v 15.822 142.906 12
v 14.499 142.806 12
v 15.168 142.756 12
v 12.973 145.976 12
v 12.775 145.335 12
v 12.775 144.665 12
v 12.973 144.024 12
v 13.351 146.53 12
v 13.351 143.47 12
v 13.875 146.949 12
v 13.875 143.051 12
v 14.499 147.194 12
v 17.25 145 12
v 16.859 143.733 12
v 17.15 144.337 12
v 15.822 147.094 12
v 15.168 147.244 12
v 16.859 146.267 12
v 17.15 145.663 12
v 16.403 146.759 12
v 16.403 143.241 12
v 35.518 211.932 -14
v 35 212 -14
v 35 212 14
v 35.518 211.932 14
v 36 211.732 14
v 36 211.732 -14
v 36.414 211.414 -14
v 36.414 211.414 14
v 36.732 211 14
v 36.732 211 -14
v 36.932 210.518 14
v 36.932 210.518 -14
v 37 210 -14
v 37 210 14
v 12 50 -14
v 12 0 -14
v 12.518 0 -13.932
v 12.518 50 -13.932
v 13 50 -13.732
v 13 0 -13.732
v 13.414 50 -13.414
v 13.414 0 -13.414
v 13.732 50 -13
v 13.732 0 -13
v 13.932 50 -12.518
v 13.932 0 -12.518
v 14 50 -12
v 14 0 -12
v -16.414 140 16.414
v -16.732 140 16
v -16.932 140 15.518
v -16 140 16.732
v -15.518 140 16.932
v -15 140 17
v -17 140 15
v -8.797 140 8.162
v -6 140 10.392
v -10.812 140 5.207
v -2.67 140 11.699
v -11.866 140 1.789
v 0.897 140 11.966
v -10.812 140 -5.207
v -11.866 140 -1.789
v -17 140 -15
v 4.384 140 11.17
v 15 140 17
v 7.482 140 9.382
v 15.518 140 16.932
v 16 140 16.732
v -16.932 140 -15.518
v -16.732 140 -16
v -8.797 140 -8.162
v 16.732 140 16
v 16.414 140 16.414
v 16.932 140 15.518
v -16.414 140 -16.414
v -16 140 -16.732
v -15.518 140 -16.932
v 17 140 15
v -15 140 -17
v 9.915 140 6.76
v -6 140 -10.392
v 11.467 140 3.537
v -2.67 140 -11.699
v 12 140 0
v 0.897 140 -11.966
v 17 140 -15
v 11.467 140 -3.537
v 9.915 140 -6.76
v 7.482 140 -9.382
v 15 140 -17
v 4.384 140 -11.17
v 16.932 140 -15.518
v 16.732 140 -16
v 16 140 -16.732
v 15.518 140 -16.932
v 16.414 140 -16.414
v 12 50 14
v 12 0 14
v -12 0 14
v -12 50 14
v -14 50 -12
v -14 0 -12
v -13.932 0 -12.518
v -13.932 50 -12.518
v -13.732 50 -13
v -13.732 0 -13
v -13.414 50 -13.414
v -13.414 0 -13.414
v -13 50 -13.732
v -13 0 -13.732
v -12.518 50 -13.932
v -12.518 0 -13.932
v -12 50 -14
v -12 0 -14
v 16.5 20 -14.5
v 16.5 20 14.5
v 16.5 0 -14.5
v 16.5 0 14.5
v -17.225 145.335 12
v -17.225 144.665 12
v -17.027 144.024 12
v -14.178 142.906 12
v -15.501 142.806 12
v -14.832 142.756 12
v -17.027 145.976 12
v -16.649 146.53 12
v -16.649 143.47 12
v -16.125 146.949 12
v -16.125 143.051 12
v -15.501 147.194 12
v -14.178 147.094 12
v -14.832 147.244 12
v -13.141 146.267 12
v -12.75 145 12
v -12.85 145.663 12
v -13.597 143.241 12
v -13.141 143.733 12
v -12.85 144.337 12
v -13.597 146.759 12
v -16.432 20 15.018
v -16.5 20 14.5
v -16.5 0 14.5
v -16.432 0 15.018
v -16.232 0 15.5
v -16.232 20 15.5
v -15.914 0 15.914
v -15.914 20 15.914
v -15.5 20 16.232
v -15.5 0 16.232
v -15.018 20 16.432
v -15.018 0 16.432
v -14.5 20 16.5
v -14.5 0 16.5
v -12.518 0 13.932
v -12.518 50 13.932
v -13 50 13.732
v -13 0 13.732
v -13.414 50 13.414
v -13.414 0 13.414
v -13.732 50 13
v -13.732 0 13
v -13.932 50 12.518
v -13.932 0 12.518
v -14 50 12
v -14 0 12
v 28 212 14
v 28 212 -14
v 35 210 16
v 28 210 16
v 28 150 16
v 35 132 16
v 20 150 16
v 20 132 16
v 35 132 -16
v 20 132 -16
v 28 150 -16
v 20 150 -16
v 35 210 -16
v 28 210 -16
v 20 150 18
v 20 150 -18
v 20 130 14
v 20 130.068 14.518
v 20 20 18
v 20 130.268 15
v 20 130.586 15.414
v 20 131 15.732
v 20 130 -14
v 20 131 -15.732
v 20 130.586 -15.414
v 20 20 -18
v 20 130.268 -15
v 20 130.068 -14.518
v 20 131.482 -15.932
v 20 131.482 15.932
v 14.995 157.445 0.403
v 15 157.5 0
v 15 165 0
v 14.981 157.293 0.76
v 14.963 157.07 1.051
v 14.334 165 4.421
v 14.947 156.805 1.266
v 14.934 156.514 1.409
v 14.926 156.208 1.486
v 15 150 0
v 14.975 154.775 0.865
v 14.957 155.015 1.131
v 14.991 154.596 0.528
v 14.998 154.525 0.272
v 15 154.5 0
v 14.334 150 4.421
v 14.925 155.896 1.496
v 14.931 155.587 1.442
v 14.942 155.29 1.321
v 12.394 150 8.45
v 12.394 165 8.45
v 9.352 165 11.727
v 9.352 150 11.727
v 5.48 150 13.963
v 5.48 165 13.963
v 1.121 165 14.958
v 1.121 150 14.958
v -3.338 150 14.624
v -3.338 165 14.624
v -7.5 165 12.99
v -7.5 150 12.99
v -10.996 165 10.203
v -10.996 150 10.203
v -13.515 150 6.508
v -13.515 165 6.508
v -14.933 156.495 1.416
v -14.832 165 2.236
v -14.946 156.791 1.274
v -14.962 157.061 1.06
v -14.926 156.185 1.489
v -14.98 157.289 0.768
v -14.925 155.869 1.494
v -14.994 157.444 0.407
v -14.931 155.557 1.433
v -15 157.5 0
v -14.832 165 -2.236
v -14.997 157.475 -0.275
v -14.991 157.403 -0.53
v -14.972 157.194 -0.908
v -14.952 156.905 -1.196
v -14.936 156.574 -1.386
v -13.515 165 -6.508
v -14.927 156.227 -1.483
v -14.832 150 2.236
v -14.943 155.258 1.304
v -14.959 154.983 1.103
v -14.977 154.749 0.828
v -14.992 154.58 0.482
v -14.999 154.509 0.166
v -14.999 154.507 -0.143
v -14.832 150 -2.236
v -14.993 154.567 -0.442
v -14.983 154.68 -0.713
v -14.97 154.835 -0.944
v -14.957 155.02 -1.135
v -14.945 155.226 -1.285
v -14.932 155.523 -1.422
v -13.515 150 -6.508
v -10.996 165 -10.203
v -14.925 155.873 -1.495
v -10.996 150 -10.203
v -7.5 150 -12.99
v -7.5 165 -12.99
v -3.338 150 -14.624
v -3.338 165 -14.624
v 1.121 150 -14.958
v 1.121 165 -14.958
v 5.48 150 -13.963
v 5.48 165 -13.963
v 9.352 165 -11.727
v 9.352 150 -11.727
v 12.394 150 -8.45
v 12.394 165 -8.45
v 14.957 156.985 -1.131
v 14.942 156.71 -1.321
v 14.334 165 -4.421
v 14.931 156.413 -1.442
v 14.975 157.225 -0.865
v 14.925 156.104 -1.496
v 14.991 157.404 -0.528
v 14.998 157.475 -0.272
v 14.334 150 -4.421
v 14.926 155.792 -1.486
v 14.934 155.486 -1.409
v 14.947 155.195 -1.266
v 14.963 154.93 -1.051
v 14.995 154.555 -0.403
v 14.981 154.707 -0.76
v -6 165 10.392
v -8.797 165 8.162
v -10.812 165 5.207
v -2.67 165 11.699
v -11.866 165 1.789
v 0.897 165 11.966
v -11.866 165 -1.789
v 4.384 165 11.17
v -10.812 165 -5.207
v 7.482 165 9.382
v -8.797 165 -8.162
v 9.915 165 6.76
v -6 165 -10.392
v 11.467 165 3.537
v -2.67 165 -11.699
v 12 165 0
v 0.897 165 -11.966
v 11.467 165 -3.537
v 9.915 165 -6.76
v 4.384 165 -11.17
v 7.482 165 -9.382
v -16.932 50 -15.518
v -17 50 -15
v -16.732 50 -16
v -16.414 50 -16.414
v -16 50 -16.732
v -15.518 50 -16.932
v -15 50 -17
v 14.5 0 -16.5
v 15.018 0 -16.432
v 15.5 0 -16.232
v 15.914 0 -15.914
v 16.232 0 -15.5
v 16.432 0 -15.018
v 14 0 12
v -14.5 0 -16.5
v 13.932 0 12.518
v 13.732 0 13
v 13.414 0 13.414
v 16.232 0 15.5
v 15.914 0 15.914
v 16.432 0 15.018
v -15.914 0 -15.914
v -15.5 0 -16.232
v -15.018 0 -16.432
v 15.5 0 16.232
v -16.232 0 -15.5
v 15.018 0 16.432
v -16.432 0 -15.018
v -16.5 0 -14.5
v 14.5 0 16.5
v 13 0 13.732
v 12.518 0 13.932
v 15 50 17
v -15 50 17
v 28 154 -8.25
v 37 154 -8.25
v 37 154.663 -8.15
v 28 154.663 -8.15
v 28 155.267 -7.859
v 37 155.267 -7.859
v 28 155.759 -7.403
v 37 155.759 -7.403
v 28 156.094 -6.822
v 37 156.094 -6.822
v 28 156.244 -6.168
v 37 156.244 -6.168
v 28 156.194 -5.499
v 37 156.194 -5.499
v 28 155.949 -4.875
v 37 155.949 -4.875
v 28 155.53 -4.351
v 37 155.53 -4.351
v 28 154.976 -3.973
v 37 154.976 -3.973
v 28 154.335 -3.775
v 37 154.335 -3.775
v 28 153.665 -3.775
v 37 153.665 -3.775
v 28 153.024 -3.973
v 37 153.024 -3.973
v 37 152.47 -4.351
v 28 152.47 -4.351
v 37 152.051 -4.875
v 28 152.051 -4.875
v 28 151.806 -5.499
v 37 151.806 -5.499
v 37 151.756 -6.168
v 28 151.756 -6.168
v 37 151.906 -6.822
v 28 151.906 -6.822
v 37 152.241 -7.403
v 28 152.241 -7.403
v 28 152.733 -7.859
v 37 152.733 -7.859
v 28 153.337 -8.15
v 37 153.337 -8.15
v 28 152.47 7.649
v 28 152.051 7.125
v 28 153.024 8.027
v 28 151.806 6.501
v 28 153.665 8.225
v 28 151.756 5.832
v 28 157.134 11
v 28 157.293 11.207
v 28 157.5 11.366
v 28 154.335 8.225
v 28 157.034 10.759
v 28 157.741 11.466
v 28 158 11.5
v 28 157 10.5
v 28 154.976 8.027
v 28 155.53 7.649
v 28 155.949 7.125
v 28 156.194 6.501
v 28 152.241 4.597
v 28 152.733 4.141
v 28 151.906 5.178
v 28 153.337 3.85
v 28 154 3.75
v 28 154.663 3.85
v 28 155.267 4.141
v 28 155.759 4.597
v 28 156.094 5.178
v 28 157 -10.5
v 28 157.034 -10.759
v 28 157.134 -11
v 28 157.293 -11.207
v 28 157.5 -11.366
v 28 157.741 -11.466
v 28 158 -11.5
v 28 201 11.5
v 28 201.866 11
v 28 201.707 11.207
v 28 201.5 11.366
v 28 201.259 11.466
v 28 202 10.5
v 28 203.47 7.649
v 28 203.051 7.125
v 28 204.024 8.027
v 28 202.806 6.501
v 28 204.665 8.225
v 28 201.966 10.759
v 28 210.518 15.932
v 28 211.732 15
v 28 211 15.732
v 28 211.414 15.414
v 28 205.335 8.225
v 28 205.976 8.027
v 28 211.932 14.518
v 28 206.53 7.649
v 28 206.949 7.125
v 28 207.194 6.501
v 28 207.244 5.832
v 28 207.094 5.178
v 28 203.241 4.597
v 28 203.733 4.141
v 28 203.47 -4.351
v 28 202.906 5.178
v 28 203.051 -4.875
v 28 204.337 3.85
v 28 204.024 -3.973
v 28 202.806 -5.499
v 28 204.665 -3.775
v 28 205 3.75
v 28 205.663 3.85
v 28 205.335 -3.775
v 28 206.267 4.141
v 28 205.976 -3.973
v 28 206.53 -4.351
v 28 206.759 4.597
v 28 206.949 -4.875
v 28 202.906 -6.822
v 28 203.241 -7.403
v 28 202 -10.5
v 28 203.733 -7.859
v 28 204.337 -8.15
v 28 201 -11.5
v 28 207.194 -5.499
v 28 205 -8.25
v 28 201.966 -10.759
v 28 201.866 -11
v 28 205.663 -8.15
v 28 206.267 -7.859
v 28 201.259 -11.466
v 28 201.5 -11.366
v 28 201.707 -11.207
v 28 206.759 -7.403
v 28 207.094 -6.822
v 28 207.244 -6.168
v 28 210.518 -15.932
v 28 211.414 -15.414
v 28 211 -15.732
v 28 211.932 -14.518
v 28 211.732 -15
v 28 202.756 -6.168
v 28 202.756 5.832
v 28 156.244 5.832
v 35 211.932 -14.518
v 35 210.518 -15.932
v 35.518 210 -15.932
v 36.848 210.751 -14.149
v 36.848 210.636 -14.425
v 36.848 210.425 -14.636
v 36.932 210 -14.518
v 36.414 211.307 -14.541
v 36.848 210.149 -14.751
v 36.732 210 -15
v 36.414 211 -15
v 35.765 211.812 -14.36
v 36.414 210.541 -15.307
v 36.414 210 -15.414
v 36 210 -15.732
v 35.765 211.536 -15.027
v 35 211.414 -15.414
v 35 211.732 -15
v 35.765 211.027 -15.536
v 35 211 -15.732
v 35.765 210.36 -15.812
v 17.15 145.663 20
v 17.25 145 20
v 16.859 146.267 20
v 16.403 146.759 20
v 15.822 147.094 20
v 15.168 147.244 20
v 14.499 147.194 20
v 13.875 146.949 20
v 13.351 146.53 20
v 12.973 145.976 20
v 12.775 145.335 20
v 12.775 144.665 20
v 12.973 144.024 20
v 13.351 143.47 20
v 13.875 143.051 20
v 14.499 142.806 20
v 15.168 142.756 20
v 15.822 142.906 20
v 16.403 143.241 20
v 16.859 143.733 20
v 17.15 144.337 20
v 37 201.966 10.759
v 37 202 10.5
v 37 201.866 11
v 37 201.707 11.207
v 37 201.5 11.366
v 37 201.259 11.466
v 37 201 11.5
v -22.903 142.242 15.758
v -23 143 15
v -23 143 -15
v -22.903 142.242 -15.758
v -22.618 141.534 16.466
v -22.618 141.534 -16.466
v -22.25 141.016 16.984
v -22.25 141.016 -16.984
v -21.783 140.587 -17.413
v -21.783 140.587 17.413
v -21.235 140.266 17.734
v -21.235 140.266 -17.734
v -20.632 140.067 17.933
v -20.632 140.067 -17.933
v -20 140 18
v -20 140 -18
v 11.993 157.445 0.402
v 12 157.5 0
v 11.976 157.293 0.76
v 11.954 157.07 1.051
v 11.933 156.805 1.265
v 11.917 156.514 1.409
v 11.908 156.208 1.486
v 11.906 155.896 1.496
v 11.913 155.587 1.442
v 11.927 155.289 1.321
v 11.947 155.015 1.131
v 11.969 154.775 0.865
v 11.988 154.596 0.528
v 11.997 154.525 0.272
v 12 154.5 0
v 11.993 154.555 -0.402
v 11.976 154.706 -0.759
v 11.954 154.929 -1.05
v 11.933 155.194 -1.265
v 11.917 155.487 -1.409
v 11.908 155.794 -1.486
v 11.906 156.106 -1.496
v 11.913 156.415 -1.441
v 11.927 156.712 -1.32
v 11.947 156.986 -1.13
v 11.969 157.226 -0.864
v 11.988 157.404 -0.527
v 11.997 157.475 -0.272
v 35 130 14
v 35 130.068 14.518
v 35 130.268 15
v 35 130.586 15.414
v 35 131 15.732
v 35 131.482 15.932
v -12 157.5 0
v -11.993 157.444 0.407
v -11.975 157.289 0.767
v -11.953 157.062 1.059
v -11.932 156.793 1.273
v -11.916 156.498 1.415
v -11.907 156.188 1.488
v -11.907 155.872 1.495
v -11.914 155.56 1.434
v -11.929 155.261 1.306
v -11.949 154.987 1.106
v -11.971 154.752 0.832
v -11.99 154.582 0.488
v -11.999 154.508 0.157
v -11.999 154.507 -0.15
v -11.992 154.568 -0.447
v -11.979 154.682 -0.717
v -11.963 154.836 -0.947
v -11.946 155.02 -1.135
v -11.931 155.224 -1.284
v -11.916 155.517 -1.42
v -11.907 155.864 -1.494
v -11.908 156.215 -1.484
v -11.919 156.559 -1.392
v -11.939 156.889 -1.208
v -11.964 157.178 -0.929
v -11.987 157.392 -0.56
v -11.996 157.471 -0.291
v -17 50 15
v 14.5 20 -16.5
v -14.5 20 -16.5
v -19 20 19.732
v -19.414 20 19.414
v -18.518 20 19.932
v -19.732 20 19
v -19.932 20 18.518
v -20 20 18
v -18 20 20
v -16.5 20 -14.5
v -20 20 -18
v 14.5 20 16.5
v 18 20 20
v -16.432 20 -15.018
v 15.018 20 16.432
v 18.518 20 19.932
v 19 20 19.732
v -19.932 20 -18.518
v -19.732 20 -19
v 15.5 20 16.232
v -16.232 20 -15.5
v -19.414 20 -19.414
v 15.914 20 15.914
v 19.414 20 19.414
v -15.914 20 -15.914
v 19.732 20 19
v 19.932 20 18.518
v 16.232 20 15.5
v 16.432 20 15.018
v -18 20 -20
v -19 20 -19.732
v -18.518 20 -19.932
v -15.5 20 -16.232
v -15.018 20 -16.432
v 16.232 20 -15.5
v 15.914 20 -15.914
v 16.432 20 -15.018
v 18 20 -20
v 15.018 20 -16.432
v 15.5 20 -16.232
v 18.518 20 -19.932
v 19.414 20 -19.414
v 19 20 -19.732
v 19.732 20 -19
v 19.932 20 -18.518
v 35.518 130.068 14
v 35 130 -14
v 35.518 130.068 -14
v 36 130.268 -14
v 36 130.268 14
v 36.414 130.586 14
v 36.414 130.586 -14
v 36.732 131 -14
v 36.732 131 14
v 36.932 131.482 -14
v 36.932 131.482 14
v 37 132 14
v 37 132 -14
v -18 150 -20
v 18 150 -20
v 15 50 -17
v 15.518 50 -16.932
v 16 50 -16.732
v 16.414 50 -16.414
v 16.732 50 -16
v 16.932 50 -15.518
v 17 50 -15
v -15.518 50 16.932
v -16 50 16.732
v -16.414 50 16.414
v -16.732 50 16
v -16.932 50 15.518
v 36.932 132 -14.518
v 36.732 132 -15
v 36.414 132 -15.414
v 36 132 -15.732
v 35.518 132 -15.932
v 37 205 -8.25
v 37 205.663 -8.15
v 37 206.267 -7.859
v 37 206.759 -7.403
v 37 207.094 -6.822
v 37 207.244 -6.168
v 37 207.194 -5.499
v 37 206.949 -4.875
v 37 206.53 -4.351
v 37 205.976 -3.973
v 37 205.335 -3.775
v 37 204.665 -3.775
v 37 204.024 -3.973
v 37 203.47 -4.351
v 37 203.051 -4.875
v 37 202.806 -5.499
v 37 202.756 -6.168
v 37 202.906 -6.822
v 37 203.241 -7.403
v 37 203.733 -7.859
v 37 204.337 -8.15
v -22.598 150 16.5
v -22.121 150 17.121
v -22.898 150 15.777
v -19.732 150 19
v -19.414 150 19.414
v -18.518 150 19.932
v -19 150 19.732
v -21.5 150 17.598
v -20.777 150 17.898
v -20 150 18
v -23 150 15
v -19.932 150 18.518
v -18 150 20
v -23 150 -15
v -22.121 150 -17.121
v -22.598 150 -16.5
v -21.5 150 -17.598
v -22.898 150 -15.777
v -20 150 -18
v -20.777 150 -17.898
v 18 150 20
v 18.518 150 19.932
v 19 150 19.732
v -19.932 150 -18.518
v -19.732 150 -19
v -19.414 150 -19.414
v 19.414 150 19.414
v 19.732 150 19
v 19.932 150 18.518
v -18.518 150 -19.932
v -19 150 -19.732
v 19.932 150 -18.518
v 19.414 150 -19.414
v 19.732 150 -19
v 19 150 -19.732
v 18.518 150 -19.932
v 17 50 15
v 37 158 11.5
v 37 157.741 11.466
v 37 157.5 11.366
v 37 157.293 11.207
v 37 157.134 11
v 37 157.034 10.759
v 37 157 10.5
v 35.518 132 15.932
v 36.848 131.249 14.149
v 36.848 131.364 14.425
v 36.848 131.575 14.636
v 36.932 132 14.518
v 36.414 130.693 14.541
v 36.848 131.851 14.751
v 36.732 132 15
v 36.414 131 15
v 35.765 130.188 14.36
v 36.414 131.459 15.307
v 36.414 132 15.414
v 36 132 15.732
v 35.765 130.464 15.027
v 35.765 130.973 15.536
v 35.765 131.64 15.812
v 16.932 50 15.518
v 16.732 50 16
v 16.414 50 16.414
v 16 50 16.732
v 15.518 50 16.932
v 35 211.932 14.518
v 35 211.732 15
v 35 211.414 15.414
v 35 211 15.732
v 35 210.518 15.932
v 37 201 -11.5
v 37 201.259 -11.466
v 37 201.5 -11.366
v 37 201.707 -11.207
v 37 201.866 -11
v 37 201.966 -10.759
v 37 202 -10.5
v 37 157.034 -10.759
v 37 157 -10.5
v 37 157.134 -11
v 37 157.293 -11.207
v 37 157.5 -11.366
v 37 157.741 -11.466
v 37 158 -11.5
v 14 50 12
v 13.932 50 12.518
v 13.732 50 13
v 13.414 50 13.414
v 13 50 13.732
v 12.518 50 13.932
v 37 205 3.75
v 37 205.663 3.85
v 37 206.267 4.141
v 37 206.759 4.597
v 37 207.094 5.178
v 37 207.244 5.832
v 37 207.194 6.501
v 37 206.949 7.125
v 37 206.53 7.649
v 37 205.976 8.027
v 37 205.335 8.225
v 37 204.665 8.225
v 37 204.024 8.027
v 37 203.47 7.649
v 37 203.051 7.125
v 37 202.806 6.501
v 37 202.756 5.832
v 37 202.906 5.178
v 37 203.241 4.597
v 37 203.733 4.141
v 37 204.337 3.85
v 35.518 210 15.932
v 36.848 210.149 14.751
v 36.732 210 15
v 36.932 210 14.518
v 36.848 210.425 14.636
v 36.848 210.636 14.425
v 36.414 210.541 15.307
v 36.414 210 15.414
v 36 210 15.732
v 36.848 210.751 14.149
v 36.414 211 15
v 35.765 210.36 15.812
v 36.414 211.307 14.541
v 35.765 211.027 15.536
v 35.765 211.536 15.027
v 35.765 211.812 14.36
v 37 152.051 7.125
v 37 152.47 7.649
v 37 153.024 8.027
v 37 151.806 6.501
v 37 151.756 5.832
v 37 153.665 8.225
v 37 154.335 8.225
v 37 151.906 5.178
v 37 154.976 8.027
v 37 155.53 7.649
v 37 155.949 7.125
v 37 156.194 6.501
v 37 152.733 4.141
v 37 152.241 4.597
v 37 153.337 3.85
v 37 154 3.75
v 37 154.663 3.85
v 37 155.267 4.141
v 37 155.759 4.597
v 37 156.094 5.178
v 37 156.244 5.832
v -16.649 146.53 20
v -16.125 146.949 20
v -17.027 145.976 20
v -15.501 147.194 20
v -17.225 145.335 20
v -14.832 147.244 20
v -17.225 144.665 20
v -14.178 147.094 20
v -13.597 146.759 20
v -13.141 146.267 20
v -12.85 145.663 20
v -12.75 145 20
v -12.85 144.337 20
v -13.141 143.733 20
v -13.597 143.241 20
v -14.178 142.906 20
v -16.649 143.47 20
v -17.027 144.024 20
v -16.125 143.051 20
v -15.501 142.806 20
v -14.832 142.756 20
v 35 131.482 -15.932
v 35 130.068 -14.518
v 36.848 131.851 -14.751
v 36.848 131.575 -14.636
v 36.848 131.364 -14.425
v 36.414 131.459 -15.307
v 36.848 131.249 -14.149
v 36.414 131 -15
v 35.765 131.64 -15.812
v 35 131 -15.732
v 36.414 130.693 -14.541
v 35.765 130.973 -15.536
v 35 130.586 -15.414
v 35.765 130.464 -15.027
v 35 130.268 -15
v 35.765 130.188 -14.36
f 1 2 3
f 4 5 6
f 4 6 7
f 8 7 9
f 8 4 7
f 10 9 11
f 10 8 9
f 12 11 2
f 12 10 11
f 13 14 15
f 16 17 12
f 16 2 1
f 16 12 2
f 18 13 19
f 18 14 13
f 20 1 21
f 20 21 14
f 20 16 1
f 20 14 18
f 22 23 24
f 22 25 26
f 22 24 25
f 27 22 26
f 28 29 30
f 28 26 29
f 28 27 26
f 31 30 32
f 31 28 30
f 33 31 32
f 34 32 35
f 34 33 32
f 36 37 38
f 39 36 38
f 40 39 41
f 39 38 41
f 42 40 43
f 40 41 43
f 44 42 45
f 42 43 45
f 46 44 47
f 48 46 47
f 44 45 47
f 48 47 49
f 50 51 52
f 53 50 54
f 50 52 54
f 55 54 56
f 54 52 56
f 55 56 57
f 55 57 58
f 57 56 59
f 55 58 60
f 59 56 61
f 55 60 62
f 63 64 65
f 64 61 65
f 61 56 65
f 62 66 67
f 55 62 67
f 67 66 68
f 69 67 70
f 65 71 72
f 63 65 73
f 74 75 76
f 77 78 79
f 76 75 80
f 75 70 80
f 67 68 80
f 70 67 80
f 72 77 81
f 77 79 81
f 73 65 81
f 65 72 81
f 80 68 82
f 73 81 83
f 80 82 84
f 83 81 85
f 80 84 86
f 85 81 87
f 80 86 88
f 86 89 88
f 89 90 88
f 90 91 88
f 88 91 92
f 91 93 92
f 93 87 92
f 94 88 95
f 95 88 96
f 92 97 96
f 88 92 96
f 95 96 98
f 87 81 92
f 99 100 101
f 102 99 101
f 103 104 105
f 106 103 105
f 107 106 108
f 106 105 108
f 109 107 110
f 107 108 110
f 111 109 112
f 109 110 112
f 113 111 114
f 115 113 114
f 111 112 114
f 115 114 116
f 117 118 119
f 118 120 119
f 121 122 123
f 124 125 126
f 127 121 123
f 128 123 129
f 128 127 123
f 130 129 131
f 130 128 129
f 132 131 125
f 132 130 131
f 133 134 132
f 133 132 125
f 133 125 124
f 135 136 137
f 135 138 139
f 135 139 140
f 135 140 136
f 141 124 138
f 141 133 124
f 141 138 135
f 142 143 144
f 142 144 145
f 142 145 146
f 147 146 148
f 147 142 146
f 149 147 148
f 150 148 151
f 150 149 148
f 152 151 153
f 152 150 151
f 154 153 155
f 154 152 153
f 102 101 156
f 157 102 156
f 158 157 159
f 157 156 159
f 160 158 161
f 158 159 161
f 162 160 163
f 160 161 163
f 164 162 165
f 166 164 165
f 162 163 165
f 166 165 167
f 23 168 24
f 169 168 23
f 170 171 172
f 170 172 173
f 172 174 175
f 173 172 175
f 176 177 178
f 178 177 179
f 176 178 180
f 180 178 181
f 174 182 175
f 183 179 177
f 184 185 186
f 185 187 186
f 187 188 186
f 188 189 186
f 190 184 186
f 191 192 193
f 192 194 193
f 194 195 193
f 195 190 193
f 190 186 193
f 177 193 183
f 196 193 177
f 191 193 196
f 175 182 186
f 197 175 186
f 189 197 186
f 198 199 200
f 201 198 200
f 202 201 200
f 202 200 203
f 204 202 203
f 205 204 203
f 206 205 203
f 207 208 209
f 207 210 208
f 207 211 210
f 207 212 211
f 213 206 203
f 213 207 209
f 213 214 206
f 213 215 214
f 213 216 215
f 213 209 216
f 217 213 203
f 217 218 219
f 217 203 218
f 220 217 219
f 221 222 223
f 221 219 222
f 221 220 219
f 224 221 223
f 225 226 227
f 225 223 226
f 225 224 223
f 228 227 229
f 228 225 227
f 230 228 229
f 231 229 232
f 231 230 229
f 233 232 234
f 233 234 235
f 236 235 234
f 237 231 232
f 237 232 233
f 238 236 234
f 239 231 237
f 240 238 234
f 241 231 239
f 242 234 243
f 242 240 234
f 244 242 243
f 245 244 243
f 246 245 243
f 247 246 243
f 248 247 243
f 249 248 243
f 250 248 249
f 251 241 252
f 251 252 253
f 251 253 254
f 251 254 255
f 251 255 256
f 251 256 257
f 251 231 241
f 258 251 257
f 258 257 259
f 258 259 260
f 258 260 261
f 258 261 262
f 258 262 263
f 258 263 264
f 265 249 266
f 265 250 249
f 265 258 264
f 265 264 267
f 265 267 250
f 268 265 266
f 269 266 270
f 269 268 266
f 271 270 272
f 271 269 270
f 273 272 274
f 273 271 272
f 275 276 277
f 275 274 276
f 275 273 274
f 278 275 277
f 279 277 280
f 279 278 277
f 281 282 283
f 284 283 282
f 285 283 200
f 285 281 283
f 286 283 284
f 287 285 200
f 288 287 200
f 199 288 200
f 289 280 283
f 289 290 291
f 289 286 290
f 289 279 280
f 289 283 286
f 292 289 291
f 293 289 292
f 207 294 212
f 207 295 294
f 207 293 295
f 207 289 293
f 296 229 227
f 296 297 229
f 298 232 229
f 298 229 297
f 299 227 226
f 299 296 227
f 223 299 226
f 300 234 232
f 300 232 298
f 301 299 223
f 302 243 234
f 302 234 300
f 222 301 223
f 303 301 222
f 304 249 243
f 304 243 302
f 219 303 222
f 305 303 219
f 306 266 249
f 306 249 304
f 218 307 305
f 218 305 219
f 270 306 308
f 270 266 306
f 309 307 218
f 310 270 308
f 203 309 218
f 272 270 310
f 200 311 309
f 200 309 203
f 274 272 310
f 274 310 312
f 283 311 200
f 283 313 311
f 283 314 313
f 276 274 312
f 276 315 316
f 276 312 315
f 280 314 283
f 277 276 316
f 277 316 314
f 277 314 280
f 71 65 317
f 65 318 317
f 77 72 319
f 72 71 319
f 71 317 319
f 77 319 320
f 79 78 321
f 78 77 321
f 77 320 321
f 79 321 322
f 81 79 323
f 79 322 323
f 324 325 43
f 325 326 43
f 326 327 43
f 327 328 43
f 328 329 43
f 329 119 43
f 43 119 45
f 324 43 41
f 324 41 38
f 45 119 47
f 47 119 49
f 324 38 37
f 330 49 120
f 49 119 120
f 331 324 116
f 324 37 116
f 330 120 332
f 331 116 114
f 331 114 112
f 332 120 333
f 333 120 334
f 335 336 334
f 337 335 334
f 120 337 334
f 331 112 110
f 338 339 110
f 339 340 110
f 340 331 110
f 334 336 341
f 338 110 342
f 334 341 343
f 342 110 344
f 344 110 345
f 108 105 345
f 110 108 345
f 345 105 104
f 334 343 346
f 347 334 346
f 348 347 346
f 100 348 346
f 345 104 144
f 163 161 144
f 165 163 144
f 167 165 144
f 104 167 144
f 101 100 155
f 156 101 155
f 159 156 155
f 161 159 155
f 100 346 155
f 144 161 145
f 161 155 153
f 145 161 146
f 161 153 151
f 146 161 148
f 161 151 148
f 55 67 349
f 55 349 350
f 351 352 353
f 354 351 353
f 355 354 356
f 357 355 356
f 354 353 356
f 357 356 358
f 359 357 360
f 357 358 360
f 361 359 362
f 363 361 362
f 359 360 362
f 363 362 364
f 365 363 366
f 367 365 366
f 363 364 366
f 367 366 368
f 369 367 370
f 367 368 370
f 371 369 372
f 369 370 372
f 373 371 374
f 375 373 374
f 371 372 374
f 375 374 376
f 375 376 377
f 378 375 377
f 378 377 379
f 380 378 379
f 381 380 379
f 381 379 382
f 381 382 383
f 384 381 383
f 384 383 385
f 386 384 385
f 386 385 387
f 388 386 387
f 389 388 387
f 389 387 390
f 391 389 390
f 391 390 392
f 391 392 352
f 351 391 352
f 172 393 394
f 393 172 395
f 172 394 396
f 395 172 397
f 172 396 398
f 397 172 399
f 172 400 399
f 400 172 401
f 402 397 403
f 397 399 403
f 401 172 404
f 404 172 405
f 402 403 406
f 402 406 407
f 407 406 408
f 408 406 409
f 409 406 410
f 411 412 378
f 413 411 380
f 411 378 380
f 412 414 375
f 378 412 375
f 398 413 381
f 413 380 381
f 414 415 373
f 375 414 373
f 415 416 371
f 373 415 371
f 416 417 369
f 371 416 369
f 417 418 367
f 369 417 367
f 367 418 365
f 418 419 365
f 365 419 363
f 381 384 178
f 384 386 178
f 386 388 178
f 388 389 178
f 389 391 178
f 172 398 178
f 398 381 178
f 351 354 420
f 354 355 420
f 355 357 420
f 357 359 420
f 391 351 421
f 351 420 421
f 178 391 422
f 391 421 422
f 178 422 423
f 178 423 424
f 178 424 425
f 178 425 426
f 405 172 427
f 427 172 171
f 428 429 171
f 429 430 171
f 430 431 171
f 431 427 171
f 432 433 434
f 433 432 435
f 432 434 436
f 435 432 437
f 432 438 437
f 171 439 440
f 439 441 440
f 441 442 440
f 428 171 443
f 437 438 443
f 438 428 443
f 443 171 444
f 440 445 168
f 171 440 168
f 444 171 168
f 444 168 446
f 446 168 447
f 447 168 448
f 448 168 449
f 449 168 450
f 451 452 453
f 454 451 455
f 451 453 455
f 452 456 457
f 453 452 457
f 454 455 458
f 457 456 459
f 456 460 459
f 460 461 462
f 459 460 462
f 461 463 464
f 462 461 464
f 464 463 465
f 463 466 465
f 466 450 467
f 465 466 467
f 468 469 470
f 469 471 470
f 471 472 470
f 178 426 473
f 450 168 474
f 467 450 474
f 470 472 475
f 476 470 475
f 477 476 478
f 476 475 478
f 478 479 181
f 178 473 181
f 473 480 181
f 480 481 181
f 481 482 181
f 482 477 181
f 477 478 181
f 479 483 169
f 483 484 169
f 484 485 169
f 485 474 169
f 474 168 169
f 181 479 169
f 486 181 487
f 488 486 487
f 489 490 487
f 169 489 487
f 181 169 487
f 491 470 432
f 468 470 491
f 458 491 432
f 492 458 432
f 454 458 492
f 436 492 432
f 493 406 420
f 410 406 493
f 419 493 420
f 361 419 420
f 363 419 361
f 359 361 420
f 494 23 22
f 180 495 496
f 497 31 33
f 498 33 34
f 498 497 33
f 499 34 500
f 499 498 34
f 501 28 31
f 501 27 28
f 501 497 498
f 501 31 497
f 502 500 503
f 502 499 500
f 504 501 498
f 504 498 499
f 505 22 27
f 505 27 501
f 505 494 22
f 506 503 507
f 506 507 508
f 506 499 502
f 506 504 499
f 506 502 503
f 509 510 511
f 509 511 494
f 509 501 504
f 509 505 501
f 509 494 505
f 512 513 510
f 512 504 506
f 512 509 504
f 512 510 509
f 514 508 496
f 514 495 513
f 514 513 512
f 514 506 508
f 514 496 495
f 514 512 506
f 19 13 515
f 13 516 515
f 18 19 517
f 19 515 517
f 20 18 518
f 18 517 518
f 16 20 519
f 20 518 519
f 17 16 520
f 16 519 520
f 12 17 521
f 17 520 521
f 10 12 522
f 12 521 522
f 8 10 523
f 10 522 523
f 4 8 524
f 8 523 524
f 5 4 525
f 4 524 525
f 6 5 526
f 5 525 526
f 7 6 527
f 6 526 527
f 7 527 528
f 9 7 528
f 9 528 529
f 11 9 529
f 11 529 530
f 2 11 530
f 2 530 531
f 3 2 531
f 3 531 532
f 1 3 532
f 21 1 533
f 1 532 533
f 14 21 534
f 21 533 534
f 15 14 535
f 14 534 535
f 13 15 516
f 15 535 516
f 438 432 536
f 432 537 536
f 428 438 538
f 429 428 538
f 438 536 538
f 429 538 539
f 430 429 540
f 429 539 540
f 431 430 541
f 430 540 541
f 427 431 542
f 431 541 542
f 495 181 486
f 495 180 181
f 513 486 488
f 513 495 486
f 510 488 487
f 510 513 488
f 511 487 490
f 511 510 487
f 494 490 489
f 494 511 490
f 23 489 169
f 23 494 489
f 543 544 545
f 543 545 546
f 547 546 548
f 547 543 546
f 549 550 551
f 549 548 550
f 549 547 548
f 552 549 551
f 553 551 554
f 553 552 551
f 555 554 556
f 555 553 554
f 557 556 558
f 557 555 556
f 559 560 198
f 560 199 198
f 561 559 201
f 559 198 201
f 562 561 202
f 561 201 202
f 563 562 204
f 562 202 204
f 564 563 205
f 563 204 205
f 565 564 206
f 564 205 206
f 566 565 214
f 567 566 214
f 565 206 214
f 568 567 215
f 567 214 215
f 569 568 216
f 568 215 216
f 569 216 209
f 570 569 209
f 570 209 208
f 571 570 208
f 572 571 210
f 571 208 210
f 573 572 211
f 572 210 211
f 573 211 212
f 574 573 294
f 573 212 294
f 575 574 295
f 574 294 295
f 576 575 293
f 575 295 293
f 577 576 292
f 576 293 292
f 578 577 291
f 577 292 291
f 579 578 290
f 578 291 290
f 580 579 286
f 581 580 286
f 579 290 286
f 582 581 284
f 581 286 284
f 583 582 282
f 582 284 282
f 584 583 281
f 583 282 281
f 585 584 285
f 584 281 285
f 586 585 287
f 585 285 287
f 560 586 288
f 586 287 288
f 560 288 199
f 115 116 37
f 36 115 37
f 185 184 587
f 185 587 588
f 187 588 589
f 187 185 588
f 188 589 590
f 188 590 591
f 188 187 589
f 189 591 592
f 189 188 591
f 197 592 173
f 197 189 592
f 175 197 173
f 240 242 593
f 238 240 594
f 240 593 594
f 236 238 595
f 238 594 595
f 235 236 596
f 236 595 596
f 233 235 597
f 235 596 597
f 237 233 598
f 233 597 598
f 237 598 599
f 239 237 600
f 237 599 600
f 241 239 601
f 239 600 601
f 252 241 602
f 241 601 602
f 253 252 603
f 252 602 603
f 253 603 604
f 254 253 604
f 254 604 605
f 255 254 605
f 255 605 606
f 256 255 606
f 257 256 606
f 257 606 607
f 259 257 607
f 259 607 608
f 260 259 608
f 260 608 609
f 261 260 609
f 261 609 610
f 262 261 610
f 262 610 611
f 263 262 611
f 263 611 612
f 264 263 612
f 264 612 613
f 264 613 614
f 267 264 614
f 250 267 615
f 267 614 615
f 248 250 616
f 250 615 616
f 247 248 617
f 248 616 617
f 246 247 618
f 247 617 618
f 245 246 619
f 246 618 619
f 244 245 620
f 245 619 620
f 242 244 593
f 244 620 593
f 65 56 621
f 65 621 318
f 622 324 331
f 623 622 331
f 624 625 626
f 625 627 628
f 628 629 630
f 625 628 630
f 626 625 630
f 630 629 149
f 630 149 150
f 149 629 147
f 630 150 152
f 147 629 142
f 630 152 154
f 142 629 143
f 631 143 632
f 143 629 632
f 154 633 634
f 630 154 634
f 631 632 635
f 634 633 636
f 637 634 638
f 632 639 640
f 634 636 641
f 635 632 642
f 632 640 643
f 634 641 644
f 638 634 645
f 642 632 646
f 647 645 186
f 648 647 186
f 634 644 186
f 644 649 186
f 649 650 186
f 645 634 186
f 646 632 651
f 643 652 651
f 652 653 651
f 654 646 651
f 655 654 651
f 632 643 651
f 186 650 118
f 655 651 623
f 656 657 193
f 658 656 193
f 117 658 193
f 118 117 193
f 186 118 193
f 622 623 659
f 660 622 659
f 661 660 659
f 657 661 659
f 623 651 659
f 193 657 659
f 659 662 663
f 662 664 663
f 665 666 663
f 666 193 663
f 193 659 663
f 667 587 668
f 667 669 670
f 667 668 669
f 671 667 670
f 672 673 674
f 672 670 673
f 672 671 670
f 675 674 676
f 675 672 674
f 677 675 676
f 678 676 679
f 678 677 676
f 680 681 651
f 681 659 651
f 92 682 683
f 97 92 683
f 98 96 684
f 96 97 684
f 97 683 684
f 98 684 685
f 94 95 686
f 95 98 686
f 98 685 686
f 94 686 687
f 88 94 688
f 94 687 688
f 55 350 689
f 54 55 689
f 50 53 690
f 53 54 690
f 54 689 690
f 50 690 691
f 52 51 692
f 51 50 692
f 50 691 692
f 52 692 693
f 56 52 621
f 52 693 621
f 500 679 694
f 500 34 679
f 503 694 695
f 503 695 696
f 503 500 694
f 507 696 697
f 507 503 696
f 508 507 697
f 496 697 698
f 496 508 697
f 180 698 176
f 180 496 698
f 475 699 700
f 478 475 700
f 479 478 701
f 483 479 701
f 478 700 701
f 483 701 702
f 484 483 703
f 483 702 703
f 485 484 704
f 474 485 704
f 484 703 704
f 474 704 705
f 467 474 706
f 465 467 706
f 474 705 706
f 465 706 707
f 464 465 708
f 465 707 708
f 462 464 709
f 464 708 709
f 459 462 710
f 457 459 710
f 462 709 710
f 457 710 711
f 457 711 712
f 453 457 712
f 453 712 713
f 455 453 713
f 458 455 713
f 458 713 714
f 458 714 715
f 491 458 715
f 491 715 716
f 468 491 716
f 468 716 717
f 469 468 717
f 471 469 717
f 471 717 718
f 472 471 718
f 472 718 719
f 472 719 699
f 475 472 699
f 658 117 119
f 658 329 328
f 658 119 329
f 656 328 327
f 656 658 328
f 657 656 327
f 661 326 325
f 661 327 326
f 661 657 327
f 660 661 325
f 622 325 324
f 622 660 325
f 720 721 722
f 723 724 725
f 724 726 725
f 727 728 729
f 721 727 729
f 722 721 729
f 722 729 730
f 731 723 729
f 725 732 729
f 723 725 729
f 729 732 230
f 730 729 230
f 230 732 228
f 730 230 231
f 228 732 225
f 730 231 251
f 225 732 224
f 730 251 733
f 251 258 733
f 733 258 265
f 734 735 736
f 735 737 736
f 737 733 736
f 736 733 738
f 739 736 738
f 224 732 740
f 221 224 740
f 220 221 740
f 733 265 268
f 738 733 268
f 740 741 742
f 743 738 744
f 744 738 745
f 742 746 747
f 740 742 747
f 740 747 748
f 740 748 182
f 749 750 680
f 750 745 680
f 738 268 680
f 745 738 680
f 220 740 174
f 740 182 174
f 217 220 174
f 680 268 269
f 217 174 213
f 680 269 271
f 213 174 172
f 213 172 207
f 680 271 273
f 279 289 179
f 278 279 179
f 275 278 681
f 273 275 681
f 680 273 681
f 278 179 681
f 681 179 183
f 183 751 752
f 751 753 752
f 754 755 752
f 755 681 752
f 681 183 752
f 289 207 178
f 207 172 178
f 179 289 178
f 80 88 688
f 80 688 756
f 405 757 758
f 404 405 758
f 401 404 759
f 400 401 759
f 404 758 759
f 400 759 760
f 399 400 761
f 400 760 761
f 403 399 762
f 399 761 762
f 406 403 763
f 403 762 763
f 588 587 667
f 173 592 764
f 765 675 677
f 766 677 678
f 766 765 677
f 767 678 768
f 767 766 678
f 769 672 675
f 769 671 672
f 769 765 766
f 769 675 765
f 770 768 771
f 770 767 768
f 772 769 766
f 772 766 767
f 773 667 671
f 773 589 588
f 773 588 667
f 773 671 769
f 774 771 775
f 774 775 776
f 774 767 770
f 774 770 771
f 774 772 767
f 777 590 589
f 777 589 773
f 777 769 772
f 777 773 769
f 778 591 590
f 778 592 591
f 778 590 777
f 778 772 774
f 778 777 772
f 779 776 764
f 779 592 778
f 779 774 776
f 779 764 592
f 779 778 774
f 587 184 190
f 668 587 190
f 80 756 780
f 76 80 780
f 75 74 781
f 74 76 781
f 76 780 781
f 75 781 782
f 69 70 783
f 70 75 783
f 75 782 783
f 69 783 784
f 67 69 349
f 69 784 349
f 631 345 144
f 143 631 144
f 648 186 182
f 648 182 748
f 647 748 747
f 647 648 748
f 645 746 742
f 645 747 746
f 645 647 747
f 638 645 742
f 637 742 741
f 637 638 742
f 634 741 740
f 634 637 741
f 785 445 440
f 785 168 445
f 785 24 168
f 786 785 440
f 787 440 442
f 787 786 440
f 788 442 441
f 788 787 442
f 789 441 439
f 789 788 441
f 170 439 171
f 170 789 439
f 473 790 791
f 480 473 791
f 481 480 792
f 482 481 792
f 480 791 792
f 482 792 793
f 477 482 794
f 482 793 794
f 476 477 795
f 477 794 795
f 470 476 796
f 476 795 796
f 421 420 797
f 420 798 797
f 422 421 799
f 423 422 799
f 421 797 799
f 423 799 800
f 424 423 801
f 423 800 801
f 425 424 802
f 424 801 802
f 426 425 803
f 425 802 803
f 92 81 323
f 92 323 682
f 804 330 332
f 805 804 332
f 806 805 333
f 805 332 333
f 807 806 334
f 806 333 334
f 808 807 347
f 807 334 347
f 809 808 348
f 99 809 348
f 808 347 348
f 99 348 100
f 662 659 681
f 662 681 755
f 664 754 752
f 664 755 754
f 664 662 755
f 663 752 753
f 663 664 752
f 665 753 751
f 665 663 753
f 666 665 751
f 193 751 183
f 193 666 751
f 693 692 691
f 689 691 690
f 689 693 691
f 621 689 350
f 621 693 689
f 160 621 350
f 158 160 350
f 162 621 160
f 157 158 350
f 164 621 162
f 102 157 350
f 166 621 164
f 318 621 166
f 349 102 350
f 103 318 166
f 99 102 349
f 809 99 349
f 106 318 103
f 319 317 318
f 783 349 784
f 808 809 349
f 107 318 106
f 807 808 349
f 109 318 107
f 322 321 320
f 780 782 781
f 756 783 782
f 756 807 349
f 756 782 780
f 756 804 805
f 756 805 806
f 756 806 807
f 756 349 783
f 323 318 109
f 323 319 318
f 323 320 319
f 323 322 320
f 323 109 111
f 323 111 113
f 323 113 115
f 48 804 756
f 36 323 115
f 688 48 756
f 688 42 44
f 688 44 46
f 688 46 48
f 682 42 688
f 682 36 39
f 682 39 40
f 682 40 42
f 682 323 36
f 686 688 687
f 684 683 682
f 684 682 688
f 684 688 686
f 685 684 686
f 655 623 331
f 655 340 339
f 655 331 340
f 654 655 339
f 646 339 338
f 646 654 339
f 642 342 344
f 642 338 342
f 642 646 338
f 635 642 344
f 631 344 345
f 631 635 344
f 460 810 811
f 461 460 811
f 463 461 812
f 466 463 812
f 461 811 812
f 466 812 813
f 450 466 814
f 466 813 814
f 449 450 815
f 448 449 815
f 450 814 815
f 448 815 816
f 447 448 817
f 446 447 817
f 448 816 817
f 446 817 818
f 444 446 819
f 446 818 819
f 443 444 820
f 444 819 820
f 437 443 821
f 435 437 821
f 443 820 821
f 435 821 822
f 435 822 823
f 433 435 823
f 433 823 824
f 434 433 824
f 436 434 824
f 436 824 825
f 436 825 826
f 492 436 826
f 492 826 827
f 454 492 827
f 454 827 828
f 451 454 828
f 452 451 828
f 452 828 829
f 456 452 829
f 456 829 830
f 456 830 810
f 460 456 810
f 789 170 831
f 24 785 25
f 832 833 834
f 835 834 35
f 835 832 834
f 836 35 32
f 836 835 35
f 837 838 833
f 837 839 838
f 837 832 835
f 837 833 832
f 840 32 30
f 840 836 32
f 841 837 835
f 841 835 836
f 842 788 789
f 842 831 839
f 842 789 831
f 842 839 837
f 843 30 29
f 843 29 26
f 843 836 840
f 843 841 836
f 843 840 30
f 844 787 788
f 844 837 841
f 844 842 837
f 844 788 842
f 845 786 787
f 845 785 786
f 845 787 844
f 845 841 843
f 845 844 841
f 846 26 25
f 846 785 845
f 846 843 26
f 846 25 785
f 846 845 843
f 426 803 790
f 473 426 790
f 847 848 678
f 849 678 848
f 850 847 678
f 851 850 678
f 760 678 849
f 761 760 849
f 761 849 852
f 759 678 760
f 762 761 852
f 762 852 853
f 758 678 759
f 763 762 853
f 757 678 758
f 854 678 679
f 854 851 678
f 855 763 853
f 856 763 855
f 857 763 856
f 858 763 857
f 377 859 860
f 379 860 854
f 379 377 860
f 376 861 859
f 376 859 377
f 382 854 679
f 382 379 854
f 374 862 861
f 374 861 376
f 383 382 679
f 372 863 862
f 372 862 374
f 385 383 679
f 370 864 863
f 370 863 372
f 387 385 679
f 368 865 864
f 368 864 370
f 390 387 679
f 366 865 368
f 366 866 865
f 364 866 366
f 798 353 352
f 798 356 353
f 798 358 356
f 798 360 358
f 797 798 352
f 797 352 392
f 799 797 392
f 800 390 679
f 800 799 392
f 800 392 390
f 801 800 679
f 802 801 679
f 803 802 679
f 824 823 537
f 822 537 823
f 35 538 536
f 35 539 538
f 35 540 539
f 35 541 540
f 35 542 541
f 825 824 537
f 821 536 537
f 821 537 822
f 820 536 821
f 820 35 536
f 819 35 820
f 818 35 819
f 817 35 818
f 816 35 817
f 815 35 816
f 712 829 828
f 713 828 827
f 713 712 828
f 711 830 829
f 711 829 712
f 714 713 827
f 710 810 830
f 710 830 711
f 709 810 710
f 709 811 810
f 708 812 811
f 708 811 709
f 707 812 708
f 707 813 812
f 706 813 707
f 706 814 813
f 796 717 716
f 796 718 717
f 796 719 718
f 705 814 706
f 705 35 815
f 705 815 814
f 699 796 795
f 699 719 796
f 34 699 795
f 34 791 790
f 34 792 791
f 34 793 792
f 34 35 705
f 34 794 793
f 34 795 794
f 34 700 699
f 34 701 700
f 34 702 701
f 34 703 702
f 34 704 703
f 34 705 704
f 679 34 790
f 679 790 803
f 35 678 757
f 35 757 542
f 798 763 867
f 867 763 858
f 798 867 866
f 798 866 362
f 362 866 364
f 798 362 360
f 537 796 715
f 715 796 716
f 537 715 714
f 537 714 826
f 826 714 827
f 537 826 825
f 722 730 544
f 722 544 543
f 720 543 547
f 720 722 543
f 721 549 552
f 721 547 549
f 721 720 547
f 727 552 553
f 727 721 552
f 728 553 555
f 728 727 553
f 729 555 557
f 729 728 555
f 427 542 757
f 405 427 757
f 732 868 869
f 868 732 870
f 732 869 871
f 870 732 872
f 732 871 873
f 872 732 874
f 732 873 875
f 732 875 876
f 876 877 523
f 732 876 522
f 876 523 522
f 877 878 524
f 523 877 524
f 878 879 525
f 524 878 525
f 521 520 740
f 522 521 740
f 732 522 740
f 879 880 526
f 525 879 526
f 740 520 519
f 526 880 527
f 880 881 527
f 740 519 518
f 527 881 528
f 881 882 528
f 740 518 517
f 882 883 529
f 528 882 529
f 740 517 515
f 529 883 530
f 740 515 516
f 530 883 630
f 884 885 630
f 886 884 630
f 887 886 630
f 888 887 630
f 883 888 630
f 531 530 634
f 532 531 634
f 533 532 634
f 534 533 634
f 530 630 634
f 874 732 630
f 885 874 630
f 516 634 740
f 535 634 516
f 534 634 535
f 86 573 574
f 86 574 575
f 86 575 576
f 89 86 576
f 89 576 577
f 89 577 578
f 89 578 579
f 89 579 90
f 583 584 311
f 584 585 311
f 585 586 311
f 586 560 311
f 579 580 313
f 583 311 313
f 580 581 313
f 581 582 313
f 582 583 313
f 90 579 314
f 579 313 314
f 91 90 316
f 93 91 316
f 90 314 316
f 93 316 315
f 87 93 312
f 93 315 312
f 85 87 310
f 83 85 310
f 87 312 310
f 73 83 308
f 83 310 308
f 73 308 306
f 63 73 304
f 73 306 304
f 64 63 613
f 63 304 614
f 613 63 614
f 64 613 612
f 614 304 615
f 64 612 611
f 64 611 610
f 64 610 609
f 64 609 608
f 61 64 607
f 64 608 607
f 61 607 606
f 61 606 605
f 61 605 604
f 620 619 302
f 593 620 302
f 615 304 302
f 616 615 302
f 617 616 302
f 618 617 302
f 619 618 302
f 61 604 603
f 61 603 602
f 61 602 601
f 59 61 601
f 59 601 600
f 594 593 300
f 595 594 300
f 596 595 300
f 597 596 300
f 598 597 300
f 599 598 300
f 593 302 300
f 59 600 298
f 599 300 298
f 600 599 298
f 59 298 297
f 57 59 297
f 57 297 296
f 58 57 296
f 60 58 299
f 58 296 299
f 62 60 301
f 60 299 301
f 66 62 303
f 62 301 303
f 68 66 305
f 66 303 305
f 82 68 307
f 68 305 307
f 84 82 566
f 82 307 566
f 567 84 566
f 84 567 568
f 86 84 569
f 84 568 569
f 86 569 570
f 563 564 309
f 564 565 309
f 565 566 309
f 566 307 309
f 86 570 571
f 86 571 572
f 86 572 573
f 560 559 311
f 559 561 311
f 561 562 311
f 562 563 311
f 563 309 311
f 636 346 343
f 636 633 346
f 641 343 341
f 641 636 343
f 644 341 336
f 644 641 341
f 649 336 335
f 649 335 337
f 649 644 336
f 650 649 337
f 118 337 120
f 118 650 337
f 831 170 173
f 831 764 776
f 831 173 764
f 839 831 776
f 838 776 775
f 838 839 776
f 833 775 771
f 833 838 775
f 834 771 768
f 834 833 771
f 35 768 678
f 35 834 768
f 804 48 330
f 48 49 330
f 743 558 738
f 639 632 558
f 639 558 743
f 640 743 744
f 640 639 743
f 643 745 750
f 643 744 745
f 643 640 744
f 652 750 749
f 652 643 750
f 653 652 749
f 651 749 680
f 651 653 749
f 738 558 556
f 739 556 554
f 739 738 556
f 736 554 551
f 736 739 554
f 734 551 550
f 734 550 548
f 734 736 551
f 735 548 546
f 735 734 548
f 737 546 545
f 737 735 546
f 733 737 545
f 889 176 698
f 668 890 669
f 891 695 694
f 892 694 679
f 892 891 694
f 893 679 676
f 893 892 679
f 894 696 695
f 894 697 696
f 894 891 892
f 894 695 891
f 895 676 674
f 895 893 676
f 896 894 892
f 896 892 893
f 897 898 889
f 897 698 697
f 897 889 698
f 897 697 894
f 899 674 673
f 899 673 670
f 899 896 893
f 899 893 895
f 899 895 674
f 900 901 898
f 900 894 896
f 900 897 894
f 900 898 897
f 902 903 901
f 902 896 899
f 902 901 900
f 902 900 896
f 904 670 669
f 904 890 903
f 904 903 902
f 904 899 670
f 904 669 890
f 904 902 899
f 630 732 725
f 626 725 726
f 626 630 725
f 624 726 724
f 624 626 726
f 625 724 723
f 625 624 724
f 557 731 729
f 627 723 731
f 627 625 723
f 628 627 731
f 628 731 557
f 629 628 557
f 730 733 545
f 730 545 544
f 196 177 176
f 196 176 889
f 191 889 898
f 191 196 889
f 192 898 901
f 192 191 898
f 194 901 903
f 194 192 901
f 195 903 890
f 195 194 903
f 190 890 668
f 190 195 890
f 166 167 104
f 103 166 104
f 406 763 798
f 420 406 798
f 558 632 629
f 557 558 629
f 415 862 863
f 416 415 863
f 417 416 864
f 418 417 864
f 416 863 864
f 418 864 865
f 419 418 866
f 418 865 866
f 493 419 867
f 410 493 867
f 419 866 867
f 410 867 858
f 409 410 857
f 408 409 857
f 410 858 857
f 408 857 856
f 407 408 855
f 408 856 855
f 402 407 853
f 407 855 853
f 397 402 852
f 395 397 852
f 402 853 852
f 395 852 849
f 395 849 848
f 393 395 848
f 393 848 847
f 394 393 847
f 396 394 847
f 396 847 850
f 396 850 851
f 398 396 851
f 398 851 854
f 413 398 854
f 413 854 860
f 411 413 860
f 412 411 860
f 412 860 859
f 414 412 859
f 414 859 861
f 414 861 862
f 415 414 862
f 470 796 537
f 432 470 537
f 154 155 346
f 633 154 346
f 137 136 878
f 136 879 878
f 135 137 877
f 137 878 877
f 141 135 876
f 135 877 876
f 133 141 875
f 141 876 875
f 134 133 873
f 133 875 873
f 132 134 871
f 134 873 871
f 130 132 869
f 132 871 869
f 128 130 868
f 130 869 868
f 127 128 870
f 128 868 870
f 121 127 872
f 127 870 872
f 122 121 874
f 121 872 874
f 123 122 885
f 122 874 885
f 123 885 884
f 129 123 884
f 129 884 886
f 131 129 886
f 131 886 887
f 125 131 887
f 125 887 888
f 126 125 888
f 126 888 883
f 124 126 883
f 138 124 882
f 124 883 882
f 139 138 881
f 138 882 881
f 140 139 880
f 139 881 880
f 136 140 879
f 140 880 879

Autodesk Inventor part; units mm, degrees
ref_plane "XZ Plane" through (0, 0, 0) normal (0, 1, 0) x (-1, 0, 0)
ref_plane "XY Plane" through (0, 0, 0) normal (0, 0, 1) x (1, 0, 0)
sketch "スケッチ1" plane through (0, 0, 0) normal (0, 1, 0) x (-1, 0, 0)
  line L0 (16.5, 16.5) -> (-16.5, 16.5)
  line L1 (-16.5, 16.5) -> (-16.5, -16.5)
  line L2 (-16.5, -16.5) -> (16.5, -16.5)
  line L3 (16.5, -16.5) -> (16.5, 16.5)
  line L4 (-23.1, 0) -> (23.1, 0) projected
  line L5 (0, -23.1) -> (0, 23.1) projected
  point P0 (0, 0)
  dimension "d0" = 33
  dimension "d1" = 33
extrude "押し出し1" add sketch "スケッチ1" along normal blind 20
fillet "フィレット1" radius 2 4 edges at (16.5, 10, 16.5) (-16.5, 10, 16.5) (16.5, 10, -16.5) (-16.5, 10, -16.5)
sketch "スケッチ2" plane through (0, 20, 0) normal (0, 1, 0) x (1, 0, 0)
  line L0 (-20, -20) -> (20, -20)
  line L1 (20, -20) -> (20, 20)
  line L2 (20, 20) -> (-20, 20)
  line L3 (-20, 20) -> (-20, -20)
  line L4 (-14.5, -16.5) -> (14.5, -16.5) projected
  line L5 (-16.5, 14.5) -> (-16.5, -14.5) projected
  line L6 (16.5, -14.5) -> (16.5, 14.5) projected
  line L7 (14.5, 16.5) -> (-14.5, 16.5) projected
  point P0 (0, 0)
  dimension "d5" = 3.5
  dimension "d6" = 3.5
  dimension "d7" = 3.5
  dimension "d8" = 3.5
extrude "押し出し2" add sketch "スケッチ2" along normal blind 30
fillet "フィレット2" radius 2 4 edges at (20, 35, 20) (20, 35, -20) (-20, 35, -20) (-20, 35, 20)
sketch "スケッチ3" plane through (0, 0, 0) normal (0, -1, 0) x (1, 0, 0)
  line L0 (12, 14) -> (-12, 14)
  line L1 (-14, 12) -> (-14, -12)
  line L2 (-12, -14) -> (12, -14)
  line L3 (14, -12) -> (14, 12)
  arc A0 (14, 12) -> (12, 14) centre (12, 12) ccw
  arc A1 (12, -14) -> (14, -12) centre (12, -12) ccw
  arc A2 (-14, -12) -> (-12, -14) centre (-12, -12) ccw
  arc A3 (-12, 14) -> (-14, 12) centre (-12, 12) ccw
  line L4 (16.5, 14.5) -> (16.5, -14.5) projected
  line L5 (14.5, -16.5) -> (-14.5, -16.5) projected
  line L6 (-14.5, 16.5) -> (14.5, 16.5) projected
  line L7 (-16.5, -14.5) -> (-16.5, 14.5) projected
  point P0 (0, 0)
  dimension "d12" = 2
  dimension "d13" = 2.5
  dimension "d14" = 2.5
  dimension "d15" = 2.5
  dimension "d16" = 2.5
extrude "押し出し3" cut sketch "スケッチ3" against normal up to next
sketch "スケッチ4" plane through (0, 50, 0) normal (0, 1, 0) x (1, 0, 0)
  line L0 (18, 20) -> (-18, 20) projected
  arc A0 (-18, 20) -> (-20, 18) centre (-18, 18) ccw projected
  line L1 (-20, 18) -> (-20, -18) projected
  arc A1 (-20, -18) -> (-18, -20) centre (-18, -18) ccw projected
  line L2 (-18, -20) -> (18, -20) projected
  arc A2 (18, -20) -> (20, -18) centre (18, -18) ccw projected
  line L3 (20, -18) -> (20, 18) projected
  arc A3 (20, 18) -> (18, 20) centre (18, 18) ccw projected
  line L4 (-15, 17) -> (15, 17)
  line L5 (17, 15) -> (17, -15)
  line L6 (15, -17) -> (-15, -17)
  line L7 (-17, -15) -> (-17, 15)
  arc A4 (-15, 17) -> (-17, 15) centre (-15, 15) ccw
  arc A5 (-17, -15) -> (-15, -17) centre (-15, -15) ccw
  arc A6 (15, -17) -> (17, -15) centre (15, -15) ccw
  arc A7 (17, 15) -> (15, 17) centre (15, 15) ccw
  point P0 (0, 0)
  dimension "d21" = 2
  dimension "d22" = 3
  dimension "d23" = 3
  dimension "d24" = 3
  dimension "d25" = 3
extrude "押し出し5" add sketch "スケッチ4" along normal blind 90
sketch "スケッチ5" plane through (0, 140, 0) normal (0, 1, 0) x (1, 0, 0)
  line L0 (18, 20) -> (-18, 20) projected
  arc A0 (-18, 20) -> (-20, 18) centre (-18, 18) ccw projected
  line L1 (-20, 18) -> (-20, -18) projected
  arc A1 (-20, -18) -> (-18, -20) centre (-18, -18) ccw projected
  line L2 (-18, -20) -> (18, -20) projected
  arc A2 (18, -20) -> (20, -18) centre (18, -18) ccw projected
  line L3 (20, -18) -> (20, 18) projected
  arc A3 (20, 18) -> (18, 20) centre (18, 18) ccw projected
  point P0 (0, 0)
extrude "押し出し6" add sketch "スケッチ5" along normal blind 10
sketch "スケッチ6" plane through (0, 150, 0) normal (0, 1, 0) x (1, 0, 0)
  circle A0 centre (0, 0) radius 15
  dimension "d30" = 30
extrude "押し出し7" add sketch "スケッチ6" along normal blind 15
sketch "スケッチ7" plane through (0, 165, 0) normal (0, 1, 0) x (1, 0, 0)
  circle A0 centre (0, 0) radius 12
  circle A1 centre (0, 0) radius 15 projected
  dimension "d33" = 3
extrude "押し出し8" cut sketch "スケッチ7" against normal up to next contours A0
sketch "スケッチ8" plane through (20, 20, 18) normal (1, 0, 0) x (0, 0, -1)
  line L0 (34, 130) -> (2, 130)
  line L1 (2, 130) -> (2, 110)
  line L2 (2, 110) -> (34, 110)
  line L3 (34, 110) -> (34, 130)
  line L4 (0, 130) -> (36, 130) projected
  line L5 (38, 0) -> (38, 130) projected
  line L6 (-2, 130) -> (-2, 0) projected
  point P0 (18, -20)
  dimension "d36" = 20
  dimension "d37" = 32
  dimension "d38" = 4
  dimension "d39" = 4
extrude "押し出し9" add sketch "スケッチ8" along normal blind 8
sketch "スケッチ9" plane through (28, 20, 18) normal (1, 0, 0) x (0, 0, -1)
  line L0 (34, 130) -> (34, 110) projected
  line L1 (34, 110) -> (2, 110)
  line L2 (2, 110) -> (2, 192)
  line L3 (2, 192) -> (34, 192)
  line L4 (34, 192) -> (34, 110)
  line L5 (34, 130) -> (2, 130) projected
  point P0 (18, -20)
  dimension "d42" = 32
  dimension "d43" = 62
extrude "押し出し10" add sketch "スケッチ9" along normal blind 9
sketch "スケッチ10" plane through (37, 20, 18) normal (1, 0, 0) x (0, 0, -1)
  line L0 (28.5, 182) -> (7.5, 182)
  line L1 (6.5, 181) -> (6.5, 138)
  line L2 (7.5, 137) -> (28.5, 137)
  line L3 (29.5, 138) -> (29.5, 181)
  line L4 (34, 192) -> (2, 192) projected
  line L5 (34, 110) -> (34, 192) projected
  line L6 (2, 192) -> (2, 110) projected
  arc A0 (29.5, 181) -> (28.5, 182) centre (28.5, 181) ccw
  arc A1 (28.5, 137) -> (29.5, 138) centre (28.5, 138) ccw
  arc A2 (6.5, 138) -> (7.5, 137) centre (7.5, 138) ccw
  arc A3 (7.5, 182) -> (6.5, 181) centre (7.5, 181) ccw
  point P0 (18, -20)
  point P1 (29.5, 182)
  point P2 (6.5, 182)
  point P3 (29.5, 137)
  dimension "d46" = 45
  dimension "d47" = 23
  dimension "d48" = 10
  dimension "d49" = 4.5
  dimension "d50" = 4.5
  dimension "d51" = 1
extrude "押し出し11" cut sketch "スケッチ10" against normal up to next
fillet "フィレット3" radius 2 8 edges at (32.5, 212, -16) (32.5, 212, 16) (28.5, 130, -16) (28.5, 130, 16) (37, 130, 0) (37, 171, -16) (37, 171, 16) (37, 212, 0)
sketch "スケッチ11" plane through (37, 20, 18) normal (1, 0, 0) x (0, 0, -1)
  circle A0 centre (24, 185) radius 2.25
  circle A1 centre (12, 185) radius 2.25
  circle A2 centre (24, 134) radius 2.25
  circle A3 centre (12, 134) radius 2.25
  line L0 (7.5, 182) -> (28.5, 182) projected
  line L1 (28.5, 137) -> (7.5, 137) projected
  line L2 (34, 112) -> (34, 190) projected
  line L3 (2, 190) -> (2, 112) projected
  point P0 (18, -20)
  point P1 (34, 150)
  point P2 (2, 150)
  dimension "d55" = 12
  dimension "d56" = 4.5
  dimension "d57" = 4.5
  dimension "d58" = 4.5
  dimension "d59" = 4.5
  dimension "d60" = 12
  dimension "d61" = 51
  dimension "d62" = 51
  dimension "d63" = 3
  dimension "d64" = 3
  dimension "d65" = 10
  dimension "d66" = 10
extrude "押し出し12" cut sketch "スケッチ11" against normal up to next contours A0
extrude "押し出し13" cut sketch "スケッチ11" against normal up to next contours A1
extrude "押し出し14" cut sketch "スケッチ11" against normal up to next contours A2
extrude "押し出し15" cut sketch "スケッチ11" against normal up to next contours A3
sketch "スケッチ21" plane through (-18, 20, 20) normal (0, 0, 1) x (1, 0, 0)
  circle A0 centre (3, 125) radius 2.25
  circle A1 centre (33, 125) radius 2.25
  line L0 (0, 0) -> (0, 130) projected
  line L1 (36, 130) -> (36, 0) projected
  line L2 (0, 130) -> (36, 130) projected
  point P0 (18, -20)
  dimension "d122" = 4.5
  dimension "d123" = 4.5
  dimension "d124" = 3
  dimension "d125" = 30
  dimension "d127" = 5
  dimension "d128" = 5
  dimension "d129" = 3
extrude "押し出し25" cut sketch "スケッチ21" against normal blind 8
ref_plane "作業平面1" through (15, 150, 0) normal (1, 0, 0) x (0, 1, 0)
sketch "スケッチ24" plane through (15, 150, 0) normal (1, 0, 0) x (0, 1, 0)
  circle A0 centre (6, 0) radius 1.5
  line L0 (-130, 20) -> (0, 20) projected
  line L1 (0, -20) -> (-130, -20) projected
  circle A1 centre (55, -6) radius 2.25 projected
  point P0 (-150, 0)
  dimension "d154" = 3
  dimension "d155" = 20
  dimension "d156" = 20
  dimension "d157" = 49
extrude "押し出し29" cut sketch "スケッチ24" against normal up to surface (35 mm away) contours A0
sketch "スケッチ25" plane through (-20, 20, -18) normal (-1, 0, 0) x (0, 0, 1)
  line L0 (36, 0) -> (36, 130) projected
  line L1 (0, 0) -> (0, 130) projected
  line L2 (36, 130) -> (0, 130)
  line L3 (0, 130) -> (0, 120)
  line L4 (0, 120) -> (36, 120)
  line L5 (36, 120) -> (36, 130)
  point P0 (18, -20)
  dimension "d160" = 10
extrude "押し出し30" add sketch "スケッチ25" along normal blind 3
fillet "フィレット6" radius 3 3 edges at (-23, 145, 18) (-23, 140, 0) (-23, 145, -18)
properties part number "tube4"
